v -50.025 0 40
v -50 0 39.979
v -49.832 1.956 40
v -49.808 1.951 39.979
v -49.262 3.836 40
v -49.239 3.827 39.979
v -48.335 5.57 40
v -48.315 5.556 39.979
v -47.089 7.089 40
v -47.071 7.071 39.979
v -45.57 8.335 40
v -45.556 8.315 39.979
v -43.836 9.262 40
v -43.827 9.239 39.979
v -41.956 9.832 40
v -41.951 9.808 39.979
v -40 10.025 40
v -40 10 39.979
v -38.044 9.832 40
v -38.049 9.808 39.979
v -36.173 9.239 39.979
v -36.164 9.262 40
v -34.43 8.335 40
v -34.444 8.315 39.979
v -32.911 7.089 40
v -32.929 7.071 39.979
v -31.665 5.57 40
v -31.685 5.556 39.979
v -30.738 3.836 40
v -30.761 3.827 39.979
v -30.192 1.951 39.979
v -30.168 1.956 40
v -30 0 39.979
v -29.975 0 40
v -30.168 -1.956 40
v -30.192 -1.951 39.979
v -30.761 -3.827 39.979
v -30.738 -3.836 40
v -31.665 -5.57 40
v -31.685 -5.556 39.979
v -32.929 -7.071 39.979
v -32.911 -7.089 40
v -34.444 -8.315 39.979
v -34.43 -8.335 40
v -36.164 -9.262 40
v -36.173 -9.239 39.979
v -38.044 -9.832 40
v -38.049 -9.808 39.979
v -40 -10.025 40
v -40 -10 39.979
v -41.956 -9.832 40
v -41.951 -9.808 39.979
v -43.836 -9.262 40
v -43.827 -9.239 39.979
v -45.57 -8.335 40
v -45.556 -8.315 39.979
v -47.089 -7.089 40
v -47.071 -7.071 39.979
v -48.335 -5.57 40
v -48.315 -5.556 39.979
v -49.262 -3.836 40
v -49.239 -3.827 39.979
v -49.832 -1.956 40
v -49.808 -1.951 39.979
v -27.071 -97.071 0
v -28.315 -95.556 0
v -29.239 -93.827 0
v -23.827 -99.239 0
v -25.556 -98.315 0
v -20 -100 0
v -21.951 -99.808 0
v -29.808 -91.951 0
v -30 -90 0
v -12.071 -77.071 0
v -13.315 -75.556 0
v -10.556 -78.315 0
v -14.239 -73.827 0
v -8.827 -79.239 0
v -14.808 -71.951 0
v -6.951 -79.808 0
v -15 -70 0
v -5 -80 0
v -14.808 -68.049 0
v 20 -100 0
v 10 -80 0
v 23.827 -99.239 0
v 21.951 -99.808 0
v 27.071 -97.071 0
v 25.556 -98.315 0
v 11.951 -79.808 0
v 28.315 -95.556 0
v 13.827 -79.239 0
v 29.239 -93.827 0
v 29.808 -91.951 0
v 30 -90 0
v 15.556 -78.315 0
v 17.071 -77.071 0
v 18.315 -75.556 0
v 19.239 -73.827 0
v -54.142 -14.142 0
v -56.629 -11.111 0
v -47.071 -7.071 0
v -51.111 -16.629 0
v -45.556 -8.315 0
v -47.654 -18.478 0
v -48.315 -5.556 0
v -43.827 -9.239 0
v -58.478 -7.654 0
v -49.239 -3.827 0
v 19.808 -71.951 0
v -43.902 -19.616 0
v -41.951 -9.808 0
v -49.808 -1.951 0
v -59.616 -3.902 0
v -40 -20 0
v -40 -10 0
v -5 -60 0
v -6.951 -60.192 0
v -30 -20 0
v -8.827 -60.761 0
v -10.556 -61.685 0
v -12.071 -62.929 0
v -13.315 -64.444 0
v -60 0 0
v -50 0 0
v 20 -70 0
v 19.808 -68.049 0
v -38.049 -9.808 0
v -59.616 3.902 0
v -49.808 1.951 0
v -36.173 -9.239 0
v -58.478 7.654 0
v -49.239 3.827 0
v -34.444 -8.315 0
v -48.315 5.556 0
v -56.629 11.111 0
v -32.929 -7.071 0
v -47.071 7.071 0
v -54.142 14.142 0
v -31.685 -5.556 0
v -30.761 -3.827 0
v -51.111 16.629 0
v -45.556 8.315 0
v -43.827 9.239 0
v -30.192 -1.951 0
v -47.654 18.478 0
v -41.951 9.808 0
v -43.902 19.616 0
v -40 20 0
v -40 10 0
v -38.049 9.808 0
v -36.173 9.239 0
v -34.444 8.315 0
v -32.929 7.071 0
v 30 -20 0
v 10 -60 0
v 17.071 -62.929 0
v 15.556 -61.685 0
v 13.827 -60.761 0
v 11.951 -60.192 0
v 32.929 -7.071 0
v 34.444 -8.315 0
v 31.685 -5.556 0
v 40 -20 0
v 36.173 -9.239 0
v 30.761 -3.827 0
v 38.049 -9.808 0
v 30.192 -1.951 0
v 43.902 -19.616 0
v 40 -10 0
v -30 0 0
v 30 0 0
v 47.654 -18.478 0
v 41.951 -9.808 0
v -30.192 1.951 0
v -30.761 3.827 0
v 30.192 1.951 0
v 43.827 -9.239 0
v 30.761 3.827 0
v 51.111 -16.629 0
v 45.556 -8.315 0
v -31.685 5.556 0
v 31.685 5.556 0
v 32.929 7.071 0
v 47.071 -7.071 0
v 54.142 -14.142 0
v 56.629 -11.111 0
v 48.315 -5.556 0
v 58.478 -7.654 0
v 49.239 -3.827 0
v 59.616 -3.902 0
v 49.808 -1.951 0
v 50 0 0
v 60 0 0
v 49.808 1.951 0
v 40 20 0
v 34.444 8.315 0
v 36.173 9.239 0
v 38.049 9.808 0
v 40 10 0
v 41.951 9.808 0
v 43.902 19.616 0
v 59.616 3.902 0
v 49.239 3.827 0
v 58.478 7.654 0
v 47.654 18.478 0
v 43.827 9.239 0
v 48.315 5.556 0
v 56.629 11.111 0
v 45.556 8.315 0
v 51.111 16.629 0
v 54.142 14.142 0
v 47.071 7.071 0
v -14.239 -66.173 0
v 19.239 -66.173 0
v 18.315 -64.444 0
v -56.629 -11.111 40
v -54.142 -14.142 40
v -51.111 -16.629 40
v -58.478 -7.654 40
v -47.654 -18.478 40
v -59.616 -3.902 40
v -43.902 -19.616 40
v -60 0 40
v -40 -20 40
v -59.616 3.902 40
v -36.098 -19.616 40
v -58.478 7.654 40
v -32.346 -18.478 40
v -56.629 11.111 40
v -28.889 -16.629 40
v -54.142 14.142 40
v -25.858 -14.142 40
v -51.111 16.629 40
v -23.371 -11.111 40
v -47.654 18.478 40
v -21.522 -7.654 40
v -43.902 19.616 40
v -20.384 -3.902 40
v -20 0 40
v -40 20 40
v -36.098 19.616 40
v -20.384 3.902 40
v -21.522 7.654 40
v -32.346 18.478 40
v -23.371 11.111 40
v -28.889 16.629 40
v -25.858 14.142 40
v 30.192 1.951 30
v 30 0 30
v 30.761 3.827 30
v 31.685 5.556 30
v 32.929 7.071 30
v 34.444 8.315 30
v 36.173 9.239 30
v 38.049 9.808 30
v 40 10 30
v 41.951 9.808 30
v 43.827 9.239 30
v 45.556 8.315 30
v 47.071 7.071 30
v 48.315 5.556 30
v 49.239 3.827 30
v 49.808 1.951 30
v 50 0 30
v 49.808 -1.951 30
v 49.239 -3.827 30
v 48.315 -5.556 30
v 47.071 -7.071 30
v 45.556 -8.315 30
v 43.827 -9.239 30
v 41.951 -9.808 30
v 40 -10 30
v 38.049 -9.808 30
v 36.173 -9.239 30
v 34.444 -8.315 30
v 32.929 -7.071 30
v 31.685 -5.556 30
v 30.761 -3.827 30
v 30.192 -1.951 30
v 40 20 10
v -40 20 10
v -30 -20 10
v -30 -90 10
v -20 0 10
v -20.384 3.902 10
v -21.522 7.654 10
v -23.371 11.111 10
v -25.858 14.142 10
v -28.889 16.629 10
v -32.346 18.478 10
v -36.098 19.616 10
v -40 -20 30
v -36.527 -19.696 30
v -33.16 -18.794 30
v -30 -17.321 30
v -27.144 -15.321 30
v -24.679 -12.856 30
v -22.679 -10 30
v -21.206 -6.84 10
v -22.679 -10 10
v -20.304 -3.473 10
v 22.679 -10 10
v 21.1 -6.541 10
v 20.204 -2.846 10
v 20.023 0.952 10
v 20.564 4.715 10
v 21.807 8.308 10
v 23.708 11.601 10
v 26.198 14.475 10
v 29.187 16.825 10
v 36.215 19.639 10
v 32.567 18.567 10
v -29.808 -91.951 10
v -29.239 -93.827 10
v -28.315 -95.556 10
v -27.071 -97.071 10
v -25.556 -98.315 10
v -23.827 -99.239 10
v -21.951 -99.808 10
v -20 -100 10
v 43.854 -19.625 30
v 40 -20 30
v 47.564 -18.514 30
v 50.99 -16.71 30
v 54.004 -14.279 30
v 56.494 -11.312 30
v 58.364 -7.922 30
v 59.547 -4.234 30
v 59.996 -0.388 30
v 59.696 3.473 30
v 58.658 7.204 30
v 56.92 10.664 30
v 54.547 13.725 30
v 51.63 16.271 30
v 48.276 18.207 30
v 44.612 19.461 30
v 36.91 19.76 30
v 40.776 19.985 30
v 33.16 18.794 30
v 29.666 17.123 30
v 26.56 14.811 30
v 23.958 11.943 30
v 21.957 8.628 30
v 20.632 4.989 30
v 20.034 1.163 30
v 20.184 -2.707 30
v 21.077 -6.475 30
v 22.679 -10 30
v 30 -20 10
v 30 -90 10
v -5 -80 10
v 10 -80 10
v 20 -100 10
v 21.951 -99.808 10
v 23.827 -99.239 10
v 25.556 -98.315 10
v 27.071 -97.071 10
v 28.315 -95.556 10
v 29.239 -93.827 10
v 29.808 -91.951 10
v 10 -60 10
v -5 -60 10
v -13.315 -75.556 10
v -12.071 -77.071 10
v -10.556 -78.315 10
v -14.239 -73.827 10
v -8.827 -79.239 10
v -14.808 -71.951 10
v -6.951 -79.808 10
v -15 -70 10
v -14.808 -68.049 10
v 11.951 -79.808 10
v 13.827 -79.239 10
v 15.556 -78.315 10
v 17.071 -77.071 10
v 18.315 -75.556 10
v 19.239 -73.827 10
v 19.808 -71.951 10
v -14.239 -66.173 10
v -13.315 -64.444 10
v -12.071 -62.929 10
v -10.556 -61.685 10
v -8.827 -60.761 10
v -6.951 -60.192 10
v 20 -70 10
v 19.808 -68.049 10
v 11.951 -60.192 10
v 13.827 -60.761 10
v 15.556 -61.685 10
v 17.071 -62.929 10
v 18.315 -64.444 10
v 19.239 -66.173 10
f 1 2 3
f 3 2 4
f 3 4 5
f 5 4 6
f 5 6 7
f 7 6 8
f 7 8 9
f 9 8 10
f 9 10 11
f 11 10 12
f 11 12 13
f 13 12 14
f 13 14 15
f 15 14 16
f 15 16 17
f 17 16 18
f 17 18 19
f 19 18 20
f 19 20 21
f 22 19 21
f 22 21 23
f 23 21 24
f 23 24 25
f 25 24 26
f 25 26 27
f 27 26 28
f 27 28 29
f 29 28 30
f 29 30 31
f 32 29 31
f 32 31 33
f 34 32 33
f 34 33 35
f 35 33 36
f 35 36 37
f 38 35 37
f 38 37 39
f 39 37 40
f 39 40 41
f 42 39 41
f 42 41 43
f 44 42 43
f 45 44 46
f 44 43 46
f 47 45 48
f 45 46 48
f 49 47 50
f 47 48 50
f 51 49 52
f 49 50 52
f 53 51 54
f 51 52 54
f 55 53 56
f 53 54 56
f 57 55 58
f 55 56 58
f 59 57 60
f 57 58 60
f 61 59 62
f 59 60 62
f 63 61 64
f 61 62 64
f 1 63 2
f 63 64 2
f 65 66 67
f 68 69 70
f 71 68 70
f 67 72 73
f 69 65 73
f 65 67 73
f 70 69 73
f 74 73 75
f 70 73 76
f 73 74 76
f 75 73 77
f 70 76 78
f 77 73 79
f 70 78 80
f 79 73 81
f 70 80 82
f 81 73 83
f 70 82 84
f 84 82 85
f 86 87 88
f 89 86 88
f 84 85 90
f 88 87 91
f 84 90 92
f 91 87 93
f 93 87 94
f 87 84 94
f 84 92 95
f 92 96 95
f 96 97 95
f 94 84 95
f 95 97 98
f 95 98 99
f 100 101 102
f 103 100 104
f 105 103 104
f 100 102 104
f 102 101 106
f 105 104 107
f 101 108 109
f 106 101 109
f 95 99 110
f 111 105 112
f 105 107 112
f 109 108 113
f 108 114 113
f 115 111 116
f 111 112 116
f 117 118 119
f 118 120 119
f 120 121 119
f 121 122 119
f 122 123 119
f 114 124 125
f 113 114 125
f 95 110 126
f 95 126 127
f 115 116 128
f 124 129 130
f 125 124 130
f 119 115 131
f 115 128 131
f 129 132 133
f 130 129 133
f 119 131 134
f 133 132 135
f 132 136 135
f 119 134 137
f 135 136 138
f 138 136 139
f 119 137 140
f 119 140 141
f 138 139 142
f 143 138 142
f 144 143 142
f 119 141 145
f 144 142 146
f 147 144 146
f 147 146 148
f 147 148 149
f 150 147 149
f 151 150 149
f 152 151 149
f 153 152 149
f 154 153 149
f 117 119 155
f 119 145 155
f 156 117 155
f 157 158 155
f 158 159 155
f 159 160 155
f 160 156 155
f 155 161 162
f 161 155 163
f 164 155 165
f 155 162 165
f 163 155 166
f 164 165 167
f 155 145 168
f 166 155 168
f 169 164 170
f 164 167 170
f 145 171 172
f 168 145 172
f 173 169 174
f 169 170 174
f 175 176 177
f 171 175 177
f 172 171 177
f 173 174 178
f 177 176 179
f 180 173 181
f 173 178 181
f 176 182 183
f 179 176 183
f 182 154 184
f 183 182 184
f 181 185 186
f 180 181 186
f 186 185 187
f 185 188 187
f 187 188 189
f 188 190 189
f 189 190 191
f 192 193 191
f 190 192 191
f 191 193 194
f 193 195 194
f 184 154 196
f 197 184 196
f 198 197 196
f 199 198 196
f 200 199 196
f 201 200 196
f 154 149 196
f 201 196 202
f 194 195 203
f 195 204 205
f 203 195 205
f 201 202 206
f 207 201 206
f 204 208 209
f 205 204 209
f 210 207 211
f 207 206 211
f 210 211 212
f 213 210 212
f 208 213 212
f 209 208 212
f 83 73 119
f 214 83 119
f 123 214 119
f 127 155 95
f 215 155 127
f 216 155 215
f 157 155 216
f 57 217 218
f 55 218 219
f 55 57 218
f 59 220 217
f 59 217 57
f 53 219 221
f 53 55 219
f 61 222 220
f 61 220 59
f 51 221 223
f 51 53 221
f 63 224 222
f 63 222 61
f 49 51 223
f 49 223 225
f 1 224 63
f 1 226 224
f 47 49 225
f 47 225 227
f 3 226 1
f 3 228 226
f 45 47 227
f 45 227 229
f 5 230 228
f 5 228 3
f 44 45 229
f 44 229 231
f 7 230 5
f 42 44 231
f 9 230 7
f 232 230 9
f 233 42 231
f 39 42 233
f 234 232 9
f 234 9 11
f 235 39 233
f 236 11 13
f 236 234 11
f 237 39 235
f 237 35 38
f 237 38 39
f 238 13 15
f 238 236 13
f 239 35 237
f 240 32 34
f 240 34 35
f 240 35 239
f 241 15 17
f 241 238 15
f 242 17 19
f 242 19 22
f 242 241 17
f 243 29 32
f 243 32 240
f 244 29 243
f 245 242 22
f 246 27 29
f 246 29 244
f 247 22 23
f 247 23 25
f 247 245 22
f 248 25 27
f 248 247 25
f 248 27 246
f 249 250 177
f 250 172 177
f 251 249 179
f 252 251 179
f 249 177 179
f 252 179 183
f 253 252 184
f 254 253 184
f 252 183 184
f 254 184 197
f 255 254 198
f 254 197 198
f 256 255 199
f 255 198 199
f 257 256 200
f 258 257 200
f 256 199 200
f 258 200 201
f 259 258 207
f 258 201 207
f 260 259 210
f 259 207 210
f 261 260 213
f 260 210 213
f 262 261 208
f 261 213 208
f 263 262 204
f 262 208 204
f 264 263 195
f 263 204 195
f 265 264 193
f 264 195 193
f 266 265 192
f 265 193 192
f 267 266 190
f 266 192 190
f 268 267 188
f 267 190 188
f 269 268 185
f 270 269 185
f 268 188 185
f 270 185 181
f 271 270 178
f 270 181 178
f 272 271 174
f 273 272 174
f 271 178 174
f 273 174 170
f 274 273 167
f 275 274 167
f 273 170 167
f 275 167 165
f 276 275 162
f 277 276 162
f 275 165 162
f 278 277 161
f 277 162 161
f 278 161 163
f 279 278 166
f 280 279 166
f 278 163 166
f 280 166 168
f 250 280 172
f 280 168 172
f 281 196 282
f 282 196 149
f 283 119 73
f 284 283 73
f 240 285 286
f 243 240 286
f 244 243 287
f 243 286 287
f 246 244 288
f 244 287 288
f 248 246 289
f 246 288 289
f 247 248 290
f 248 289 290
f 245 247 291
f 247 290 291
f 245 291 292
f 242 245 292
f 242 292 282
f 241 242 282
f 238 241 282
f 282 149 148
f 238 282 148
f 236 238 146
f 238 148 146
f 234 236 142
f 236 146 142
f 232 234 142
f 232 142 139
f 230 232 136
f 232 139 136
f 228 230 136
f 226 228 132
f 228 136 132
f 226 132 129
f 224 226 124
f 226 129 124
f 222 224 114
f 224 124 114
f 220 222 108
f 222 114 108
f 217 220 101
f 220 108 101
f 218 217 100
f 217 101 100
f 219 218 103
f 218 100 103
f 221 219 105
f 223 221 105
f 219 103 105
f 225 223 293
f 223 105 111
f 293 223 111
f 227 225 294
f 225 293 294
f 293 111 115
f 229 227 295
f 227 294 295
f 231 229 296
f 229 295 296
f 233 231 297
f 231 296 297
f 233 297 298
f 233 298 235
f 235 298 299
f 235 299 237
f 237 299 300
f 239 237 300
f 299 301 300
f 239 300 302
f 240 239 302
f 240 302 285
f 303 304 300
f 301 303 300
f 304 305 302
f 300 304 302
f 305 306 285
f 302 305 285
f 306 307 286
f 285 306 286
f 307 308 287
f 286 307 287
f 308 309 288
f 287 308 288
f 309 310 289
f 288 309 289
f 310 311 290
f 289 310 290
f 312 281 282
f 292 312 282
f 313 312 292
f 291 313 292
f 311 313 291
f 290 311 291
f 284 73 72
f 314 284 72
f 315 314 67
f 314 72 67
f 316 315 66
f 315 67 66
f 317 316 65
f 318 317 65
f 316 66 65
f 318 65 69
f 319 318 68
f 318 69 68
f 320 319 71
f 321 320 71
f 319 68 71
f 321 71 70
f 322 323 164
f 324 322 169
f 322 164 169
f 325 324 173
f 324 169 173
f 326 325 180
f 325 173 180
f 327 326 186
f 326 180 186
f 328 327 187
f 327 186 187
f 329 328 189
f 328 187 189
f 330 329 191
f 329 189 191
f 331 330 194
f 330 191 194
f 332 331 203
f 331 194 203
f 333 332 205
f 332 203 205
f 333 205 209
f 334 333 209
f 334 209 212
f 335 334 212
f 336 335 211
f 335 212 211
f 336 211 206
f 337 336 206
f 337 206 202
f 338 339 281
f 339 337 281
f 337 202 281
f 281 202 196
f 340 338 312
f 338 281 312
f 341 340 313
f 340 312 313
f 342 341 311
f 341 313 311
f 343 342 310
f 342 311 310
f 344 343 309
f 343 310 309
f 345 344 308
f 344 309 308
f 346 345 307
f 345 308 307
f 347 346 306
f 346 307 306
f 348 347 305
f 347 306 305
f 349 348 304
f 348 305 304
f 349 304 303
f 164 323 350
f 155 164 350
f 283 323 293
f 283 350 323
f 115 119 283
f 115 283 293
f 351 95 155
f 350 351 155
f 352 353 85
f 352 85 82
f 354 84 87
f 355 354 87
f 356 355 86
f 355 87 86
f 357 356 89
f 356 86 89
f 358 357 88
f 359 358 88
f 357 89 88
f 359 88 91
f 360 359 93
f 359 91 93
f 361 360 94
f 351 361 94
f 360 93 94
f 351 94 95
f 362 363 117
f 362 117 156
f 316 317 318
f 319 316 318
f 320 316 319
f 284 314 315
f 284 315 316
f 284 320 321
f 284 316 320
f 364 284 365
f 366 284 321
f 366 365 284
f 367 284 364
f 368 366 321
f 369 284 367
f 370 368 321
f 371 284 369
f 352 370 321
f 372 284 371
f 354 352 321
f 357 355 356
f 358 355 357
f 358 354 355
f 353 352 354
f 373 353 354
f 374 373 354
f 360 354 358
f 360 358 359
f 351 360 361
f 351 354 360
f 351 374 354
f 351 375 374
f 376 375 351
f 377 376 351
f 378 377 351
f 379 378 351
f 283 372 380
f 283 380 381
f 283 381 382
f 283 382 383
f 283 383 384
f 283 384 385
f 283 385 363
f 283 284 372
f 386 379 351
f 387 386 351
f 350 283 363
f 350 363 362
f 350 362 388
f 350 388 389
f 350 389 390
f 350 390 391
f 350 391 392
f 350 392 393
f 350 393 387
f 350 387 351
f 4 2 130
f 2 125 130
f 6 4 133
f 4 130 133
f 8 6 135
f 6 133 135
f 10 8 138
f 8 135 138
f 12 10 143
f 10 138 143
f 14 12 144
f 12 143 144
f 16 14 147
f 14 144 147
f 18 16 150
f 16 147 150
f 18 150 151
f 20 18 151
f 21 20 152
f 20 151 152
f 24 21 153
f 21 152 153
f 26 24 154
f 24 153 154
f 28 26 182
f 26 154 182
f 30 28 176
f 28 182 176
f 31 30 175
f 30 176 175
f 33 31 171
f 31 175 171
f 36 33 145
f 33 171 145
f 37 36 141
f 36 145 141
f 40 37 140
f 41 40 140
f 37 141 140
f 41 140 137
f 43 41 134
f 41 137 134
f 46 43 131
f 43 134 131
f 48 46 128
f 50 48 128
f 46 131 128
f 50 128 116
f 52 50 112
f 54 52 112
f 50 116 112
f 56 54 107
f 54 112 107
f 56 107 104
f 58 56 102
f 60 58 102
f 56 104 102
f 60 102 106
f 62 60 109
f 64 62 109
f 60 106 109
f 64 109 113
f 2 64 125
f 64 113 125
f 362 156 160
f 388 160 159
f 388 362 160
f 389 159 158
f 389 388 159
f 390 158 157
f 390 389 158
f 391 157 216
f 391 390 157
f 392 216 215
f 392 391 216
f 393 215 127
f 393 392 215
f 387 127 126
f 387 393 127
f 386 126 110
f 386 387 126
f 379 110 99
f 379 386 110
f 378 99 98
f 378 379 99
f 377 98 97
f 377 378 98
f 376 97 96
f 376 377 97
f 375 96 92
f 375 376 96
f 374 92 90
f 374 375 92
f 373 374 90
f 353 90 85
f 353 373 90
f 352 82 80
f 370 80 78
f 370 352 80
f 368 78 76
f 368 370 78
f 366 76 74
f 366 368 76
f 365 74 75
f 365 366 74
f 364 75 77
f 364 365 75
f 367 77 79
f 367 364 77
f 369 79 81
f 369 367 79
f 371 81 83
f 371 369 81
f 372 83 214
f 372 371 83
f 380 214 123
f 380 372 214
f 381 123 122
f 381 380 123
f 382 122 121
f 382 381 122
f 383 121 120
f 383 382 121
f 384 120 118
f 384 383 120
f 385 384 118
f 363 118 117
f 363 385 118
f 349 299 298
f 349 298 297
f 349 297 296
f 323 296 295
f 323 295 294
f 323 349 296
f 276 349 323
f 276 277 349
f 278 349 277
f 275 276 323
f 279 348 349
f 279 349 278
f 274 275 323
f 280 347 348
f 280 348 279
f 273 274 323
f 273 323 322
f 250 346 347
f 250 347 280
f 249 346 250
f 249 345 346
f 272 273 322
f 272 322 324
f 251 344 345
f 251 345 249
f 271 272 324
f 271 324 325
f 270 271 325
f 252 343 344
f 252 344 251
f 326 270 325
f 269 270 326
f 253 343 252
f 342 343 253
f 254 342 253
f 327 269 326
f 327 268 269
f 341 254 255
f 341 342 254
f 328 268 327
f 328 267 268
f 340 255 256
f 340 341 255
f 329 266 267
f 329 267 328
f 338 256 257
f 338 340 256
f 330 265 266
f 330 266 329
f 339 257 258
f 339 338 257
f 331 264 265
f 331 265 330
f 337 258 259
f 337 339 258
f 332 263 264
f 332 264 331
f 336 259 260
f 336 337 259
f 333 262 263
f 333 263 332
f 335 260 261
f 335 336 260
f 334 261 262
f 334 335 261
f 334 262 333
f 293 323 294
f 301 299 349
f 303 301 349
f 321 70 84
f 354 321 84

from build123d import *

# Parameters (mm, degrees)
SKETCH1_R                        = 20
BOSS_EXTRUDE1_DEPTH              = 40
SKETCH1_3_R                      = 20
BOSS_EXTRUDE2_DEPTH              = 30
SKETCH2_W                        = 80
SKETCH2_H                        = 40
BOSS_EXTRUDE3_DEPTH              = 10
SKETCH3_W                        = 80
SKETCH3_H                        = 10
BOSS_EXTRUDE4_DEPTH              = 30
BOSS_EXTRUDE5_DEPTH              = 10
CUT_EXTRUDE1_DEPTH               = 121.415945788
F_20_0MM_DOWEL_HOLE1_D           = 20
F_20_0MM_DOWEL_HOLE1_CSINK_D     = 20.05
F_20_0MM_DOWEL_HOLE1_CSINK_ANGLE = 100


with BuildPart() as part:
    # Sketch1 → Boss-Extrude1 (new body)
    with BuildSketch(Plane.XY):
        with Locations((-40, 0)):
            Circle(SKETCH1_R)
    extrude(amount=BOSS_EXTRUDE1_DEPTH)



with BuildPart() as body_2:
    # Sketch1<3> → Boss-Extrude2 (new body)
    with BuildSketch(Plane.XY):
        with Locations((40, 0)):
            Circle(SKETCH1_3_R)
    extrude(amount=BOSS_EXTRUDE2_DEPTH)


with BuildPart() as part_1:
    add(part.part)

    add(body_2.part)  # Boss-Extrude3 merges body 2
    # Sketch2 → Boss-Extrude3 (add)
    with BuildSketch(Plane(origin=(0, 0, 0), x_dir=(-1, 0, 0), z_dir=(0, 0, -1))):
        Rectangle(SKETCH2_W, SKETCH2_H)
    extrude(amount=-BOSS_EXTRUDE3_DEPTH)

    # Sketch3 → Boss-Extrude4 (add)
    with BuildSketch(Plane.XY.offset(30)):
        with Locations((0, -15)):
            Rectangle(SKETCH3_W, SKETCH3_H)
    extrude(amount=-BOSS_EXTRUDE4_DEPTH)

    # Sketch4 → Boss-Extrude5 (add)
    with BuildSketch(Plane(origin=(0, 0, 0), x_dir=(-1, 0, 0), z_dir=(0, 0, -1))):
        with BuildLine():
            Line((-30, -20), (30, -20))
            Line((30, -20), (30, -90))
            ThreePointArc((30, -90), (27.071067812, -97.071067812), (20, -100))
            Line((20, -100), (-20, -100))
            ThreePointArc((-20, -100), (-27.071067812, -97.071067812), (-30, -90))
            Line((-30, -90), (-30, -20))
        make_face()
    extrude(amount=-BOSS_EXTRUDE5_DEPTH)

    # Sketch5 → Cut-Extrude1 (cut, through all)
    with BuildSketch(Plane.XY.offset(10)):
        with BuildLine():
            Line((-5, -60), (10, -60))
            ThreePointArc((10, -60), (20, -70), (10, -80))
            Line((10, -80), (-5, -80))
            ThreePointArc((-5, -80), (-15, -70), (-5, -60))
        make_face()
    extrude(amount=-CUT_EXTRUDE1_DEPTH, mode=Mode.SUBTRACT)

    # Ø20.0mm Dowel Hole1 (through all)
    with Locations(Plane.XY.offset(40)):
        with Locations((-40, 0), (40, 0)):
            CounterSinkHole(F_20_0MM_DOWEL_HOLE1_D / 2, F_20_0MM_DOWEL_HOLE1_CSINK_D / 2, counter_sink_angle=F_20_0MM_DOWEL_HOLE1_CSINK_ANGLE)


solid = part_1.part
